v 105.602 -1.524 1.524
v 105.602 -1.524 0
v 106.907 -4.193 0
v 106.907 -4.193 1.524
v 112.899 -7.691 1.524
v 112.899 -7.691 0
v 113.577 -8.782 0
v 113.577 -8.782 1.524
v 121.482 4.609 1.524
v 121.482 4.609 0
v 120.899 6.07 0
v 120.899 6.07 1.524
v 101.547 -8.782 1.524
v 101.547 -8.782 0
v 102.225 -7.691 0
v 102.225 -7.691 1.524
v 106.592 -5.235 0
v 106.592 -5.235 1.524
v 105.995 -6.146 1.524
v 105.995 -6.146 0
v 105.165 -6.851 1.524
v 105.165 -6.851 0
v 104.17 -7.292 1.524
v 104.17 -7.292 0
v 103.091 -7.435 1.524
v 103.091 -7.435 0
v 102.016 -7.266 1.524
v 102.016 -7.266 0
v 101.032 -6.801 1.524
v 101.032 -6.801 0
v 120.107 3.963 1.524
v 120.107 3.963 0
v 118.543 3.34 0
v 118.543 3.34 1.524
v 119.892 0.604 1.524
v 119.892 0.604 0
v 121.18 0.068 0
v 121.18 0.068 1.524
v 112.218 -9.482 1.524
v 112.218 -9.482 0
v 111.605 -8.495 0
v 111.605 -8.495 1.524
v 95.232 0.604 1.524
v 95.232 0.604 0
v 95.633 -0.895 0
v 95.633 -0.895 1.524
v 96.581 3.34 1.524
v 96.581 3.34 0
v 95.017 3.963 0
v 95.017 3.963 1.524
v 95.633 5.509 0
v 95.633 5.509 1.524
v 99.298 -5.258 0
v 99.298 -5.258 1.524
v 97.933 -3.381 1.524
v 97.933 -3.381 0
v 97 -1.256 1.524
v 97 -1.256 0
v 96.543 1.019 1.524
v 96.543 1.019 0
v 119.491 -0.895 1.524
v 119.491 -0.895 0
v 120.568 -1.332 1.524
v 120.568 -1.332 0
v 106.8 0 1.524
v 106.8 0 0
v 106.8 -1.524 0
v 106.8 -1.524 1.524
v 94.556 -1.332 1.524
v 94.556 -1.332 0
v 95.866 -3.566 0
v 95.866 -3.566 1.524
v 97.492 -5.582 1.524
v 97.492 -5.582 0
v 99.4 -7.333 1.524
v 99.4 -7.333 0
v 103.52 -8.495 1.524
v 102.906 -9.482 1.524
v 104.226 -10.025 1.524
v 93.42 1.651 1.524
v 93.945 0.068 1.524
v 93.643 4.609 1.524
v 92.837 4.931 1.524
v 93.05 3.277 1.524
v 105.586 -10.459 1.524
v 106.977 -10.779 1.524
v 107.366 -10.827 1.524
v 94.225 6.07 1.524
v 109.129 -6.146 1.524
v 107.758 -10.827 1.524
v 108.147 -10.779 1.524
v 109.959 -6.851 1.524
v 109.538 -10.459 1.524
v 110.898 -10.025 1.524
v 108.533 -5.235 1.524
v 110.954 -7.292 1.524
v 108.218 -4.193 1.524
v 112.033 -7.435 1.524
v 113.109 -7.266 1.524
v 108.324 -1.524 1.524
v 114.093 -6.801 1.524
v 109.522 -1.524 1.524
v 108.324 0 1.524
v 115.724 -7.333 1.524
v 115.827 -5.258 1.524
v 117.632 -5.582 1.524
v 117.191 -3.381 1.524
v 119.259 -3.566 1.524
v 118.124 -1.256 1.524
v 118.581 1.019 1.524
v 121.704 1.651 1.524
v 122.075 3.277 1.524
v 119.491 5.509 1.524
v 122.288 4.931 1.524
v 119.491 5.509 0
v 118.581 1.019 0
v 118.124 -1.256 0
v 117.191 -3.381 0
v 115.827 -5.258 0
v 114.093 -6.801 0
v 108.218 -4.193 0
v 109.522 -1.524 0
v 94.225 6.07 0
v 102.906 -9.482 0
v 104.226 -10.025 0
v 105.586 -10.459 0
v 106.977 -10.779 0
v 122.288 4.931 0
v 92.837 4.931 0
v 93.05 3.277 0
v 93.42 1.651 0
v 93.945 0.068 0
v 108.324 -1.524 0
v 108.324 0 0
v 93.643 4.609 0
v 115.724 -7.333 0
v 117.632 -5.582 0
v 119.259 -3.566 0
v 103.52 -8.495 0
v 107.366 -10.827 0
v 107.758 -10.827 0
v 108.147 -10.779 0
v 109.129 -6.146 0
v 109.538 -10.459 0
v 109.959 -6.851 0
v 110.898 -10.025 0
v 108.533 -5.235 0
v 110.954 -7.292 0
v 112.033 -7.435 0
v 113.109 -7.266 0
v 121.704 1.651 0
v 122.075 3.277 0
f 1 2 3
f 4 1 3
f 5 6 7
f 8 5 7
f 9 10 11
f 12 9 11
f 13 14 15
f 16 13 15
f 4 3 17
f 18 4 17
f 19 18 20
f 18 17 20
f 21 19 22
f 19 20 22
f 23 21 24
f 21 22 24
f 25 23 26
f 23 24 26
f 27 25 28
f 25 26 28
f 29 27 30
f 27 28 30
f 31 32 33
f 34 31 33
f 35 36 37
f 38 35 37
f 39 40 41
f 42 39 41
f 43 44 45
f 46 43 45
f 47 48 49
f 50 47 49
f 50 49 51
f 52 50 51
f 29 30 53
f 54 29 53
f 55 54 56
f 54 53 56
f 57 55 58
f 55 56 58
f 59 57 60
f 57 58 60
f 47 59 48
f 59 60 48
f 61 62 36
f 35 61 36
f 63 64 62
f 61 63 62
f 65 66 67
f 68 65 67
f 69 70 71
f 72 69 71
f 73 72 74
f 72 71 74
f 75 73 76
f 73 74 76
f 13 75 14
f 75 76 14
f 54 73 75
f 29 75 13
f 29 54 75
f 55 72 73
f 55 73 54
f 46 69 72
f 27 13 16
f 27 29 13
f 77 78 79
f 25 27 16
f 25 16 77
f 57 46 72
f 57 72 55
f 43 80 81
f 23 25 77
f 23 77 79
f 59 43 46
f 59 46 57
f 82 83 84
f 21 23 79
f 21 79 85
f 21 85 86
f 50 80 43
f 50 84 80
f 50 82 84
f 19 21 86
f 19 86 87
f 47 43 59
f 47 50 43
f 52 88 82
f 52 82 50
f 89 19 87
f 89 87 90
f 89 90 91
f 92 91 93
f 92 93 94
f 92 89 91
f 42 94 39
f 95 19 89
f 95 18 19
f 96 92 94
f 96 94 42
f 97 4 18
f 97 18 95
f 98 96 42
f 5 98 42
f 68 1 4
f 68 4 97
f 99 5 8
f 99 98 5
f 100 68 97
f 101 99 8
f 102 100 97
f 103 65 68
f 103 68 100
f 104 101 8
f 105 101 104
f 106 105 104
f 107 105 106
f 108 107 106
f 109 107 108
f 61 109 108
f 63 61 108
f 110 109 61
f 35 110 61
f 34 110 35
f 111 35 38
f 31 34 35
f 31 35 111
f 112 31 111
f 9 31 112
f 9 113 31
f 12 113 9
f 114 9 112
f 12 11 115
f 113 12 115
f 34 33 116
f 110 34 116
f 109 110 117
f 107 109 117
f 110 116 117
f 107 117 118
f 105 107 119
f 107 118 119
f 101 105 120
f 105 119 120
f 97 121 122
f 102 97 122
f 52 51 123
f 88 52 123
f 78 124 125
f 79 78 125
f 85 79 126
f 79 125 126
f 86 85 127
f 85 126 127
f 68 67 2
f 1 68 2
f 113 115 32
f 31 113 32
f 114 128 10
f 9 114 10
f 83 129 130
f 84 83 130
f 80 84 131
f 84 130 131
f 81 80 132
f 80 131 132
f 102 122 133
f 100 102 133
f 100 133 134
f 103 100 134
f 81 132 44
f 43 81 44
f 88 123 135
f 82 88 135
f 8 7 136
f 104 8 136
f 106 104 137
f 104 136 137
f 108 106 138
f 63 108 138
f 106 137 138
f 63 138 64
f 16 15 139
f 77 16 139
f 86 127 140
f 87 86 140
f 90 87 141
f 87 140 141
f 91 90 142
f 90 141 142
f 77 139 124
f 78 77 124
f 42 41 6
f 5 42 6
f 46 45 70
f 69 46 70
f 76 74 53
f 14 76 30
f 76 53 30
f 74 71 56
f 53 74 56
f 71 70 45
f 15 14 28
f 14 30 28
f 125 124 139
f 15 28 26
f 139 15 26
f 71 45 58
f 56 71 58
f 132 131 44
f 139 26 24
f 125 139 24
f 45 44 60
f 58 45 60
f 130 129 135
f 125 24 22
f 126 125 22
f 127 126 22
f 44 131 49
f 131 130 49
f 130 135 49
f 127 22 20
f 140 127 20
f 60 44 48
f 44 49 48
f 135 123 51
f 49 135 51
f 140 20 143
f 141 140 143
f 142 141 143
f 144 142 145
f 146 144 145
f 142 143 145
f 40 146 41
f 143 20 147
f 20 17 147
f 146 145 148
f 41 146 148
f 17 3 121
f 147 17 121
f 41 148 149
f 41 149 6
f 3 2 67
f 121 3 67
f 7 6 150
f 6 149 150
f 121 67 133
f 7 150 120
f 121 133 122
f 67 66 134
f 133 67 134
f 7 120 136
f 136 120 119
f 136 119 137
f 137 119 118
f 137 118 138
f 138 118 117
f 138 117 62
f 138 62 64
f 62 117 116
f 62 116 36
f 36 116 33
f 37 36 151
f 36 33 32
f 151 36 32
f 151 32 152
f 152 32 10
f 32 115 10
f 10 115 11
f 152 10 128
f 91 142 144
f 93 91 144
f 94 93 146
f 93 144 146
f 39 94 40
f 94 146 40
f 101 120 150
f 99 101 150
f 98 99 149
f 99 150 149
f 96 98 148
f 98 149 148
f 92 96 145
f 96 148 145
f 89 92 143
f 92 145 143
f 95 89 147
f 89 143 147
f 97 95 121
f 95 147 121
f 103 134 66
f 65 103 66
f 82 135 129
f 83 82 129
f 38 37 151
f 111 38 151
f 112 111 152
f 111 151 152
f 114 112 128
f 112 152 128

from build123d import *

# Parameters (mm, degrees)
BOSS_EXTRUDE1_DEPTH = 1.524


with BuildPart() as part:
    # Sketch1 → Boss-Extrude1 (new body)
    with BuildSketch(Plane.XY):
        with BuildLine():
            Line((106.800157748, 0), (106.800157748, -1.524))
            Line((106.800157748, -1.524), (105.60228421, -1.524))
            Line((105.60228421, -1.524), (106.906721504, -4.193201134))
            ThreePointArc((106.906721504, -4.193201134), (104.68375507, -7.107123849), (101.031549593, -6.800659311))
            ThreePointArc((101.031549593, -6.800659311), (97.409591285, -2.343413311), (96.581327911, 3.339860717))
            Line((96.581327911, 3.339860717), (95.016948104, 3.963243569))
            Line((95.016948104, 3.963243569), (95.633020179, 5.509276977))
            Line((95.633020179, 5.509276977), (94.224893193, 6.070395327))
            Line((94.224893193, 6.070395327), (93.642665079, 4.609293369))
            Line((93.642665079, 4.609293369), (92.836519037, 4.930530972))
            ThreePointArc((92.836519037, 4.930530972), (93.215521974, 2.459616544), (93.944606865, 0.068487824))
            Line((93.944606865, 0.068487824), (95.231857751, 0.60397688))
            Line((95.231857751, 0.60397688), (95.633020179, -0.895095706))
            Line((95.633020179, -0.895095706), (94.556110103, -1.331762333))
            ThreePointArc((94.556110103, -1.331762333), (97.492489487, -5.581662211), (101.546965864, -8.782473698))
            Line((101.546965864, -8.782473698), (102.225393513, -7.690984294))
            Line((102.225393513, -7.690984294), (103.519739314, -8.495499643))
            Line((103.519739314, -8.495499643), (102.906411146, -9.482253643))
            ThreePointArc((102.906411146, -9.482253643), (104.901784449, -10.255997053), (106.977037338, -10.77898742))
            ThreePointArc((106.977037338, -10.77898742), (107.562157749, -10.833369035), (108.14727816, -10.77898742))
            ThreePointArc((108.14727816, -10.77898742), (110.222531049, -10.255997053), (112.217904351, -9.482253643))
            Line((112.217904351, -9.482253643), (111.604576184, -8.495499643))
            Line((111.604576184, -8.495499643), (112.898921985, -7.690984294))
            Line((112.898921985, -7.690984294), (113.577349634, -8.782473698))
            ThreePointArc((113.577349634, -8.782473698), (117.631826011, -5.581662211), (120.568205395, -1.331762333))
            Line((120.568205395, -1.331762333), (119.491295318, -0.895095706))
            Line((119.491295318, -0.895095706), (119.892457747, 0.60397688))
            Line((119.892457747, 0.60397688), (121.179708632, 0.068487824))
            ThreePointArc((121.179708632, 0.068487824), (121.908793523, 2.459616544), (122.287796461, 4.930530972))
            Line((122.287796461, 4.930530972), (121.481650419, 4.609293369))
            Line((121.481650419, 4.609293369), (120.899422305, 6.070395327))
            Line((120.899422305, 6.070395327), (119.491295318, 5.509276977))
            Line((119.491295318, 5.509276977), (120.107367394, 3.963243569))
            Line((120.107367394, 3.963243569), (118.542987586, 3.339860717))
            ThreePointArc((118.542987586, 3.339860717), (117.714724213, -2.343413311), (114.092765904, -6.800659311))
            ThreePointArc((114.092765904, -6.800659311), (110.440560427, -7.107123849), (108.217593993, -4.193201134))
            Line((108.217593993, -4.193201134), (109.522031288, -1.524))
            Line((109.522031288, -1.524), (108.32415775, -1.524))
            Line((108.32415775, -1.524), (108.32415775, 0))
            Line((108.32415775, 0), (106.800157748, 0))
        make_face()
    extrude(amount=BOSS_EXTRUDE1_DEPTH)


solid = part.part
